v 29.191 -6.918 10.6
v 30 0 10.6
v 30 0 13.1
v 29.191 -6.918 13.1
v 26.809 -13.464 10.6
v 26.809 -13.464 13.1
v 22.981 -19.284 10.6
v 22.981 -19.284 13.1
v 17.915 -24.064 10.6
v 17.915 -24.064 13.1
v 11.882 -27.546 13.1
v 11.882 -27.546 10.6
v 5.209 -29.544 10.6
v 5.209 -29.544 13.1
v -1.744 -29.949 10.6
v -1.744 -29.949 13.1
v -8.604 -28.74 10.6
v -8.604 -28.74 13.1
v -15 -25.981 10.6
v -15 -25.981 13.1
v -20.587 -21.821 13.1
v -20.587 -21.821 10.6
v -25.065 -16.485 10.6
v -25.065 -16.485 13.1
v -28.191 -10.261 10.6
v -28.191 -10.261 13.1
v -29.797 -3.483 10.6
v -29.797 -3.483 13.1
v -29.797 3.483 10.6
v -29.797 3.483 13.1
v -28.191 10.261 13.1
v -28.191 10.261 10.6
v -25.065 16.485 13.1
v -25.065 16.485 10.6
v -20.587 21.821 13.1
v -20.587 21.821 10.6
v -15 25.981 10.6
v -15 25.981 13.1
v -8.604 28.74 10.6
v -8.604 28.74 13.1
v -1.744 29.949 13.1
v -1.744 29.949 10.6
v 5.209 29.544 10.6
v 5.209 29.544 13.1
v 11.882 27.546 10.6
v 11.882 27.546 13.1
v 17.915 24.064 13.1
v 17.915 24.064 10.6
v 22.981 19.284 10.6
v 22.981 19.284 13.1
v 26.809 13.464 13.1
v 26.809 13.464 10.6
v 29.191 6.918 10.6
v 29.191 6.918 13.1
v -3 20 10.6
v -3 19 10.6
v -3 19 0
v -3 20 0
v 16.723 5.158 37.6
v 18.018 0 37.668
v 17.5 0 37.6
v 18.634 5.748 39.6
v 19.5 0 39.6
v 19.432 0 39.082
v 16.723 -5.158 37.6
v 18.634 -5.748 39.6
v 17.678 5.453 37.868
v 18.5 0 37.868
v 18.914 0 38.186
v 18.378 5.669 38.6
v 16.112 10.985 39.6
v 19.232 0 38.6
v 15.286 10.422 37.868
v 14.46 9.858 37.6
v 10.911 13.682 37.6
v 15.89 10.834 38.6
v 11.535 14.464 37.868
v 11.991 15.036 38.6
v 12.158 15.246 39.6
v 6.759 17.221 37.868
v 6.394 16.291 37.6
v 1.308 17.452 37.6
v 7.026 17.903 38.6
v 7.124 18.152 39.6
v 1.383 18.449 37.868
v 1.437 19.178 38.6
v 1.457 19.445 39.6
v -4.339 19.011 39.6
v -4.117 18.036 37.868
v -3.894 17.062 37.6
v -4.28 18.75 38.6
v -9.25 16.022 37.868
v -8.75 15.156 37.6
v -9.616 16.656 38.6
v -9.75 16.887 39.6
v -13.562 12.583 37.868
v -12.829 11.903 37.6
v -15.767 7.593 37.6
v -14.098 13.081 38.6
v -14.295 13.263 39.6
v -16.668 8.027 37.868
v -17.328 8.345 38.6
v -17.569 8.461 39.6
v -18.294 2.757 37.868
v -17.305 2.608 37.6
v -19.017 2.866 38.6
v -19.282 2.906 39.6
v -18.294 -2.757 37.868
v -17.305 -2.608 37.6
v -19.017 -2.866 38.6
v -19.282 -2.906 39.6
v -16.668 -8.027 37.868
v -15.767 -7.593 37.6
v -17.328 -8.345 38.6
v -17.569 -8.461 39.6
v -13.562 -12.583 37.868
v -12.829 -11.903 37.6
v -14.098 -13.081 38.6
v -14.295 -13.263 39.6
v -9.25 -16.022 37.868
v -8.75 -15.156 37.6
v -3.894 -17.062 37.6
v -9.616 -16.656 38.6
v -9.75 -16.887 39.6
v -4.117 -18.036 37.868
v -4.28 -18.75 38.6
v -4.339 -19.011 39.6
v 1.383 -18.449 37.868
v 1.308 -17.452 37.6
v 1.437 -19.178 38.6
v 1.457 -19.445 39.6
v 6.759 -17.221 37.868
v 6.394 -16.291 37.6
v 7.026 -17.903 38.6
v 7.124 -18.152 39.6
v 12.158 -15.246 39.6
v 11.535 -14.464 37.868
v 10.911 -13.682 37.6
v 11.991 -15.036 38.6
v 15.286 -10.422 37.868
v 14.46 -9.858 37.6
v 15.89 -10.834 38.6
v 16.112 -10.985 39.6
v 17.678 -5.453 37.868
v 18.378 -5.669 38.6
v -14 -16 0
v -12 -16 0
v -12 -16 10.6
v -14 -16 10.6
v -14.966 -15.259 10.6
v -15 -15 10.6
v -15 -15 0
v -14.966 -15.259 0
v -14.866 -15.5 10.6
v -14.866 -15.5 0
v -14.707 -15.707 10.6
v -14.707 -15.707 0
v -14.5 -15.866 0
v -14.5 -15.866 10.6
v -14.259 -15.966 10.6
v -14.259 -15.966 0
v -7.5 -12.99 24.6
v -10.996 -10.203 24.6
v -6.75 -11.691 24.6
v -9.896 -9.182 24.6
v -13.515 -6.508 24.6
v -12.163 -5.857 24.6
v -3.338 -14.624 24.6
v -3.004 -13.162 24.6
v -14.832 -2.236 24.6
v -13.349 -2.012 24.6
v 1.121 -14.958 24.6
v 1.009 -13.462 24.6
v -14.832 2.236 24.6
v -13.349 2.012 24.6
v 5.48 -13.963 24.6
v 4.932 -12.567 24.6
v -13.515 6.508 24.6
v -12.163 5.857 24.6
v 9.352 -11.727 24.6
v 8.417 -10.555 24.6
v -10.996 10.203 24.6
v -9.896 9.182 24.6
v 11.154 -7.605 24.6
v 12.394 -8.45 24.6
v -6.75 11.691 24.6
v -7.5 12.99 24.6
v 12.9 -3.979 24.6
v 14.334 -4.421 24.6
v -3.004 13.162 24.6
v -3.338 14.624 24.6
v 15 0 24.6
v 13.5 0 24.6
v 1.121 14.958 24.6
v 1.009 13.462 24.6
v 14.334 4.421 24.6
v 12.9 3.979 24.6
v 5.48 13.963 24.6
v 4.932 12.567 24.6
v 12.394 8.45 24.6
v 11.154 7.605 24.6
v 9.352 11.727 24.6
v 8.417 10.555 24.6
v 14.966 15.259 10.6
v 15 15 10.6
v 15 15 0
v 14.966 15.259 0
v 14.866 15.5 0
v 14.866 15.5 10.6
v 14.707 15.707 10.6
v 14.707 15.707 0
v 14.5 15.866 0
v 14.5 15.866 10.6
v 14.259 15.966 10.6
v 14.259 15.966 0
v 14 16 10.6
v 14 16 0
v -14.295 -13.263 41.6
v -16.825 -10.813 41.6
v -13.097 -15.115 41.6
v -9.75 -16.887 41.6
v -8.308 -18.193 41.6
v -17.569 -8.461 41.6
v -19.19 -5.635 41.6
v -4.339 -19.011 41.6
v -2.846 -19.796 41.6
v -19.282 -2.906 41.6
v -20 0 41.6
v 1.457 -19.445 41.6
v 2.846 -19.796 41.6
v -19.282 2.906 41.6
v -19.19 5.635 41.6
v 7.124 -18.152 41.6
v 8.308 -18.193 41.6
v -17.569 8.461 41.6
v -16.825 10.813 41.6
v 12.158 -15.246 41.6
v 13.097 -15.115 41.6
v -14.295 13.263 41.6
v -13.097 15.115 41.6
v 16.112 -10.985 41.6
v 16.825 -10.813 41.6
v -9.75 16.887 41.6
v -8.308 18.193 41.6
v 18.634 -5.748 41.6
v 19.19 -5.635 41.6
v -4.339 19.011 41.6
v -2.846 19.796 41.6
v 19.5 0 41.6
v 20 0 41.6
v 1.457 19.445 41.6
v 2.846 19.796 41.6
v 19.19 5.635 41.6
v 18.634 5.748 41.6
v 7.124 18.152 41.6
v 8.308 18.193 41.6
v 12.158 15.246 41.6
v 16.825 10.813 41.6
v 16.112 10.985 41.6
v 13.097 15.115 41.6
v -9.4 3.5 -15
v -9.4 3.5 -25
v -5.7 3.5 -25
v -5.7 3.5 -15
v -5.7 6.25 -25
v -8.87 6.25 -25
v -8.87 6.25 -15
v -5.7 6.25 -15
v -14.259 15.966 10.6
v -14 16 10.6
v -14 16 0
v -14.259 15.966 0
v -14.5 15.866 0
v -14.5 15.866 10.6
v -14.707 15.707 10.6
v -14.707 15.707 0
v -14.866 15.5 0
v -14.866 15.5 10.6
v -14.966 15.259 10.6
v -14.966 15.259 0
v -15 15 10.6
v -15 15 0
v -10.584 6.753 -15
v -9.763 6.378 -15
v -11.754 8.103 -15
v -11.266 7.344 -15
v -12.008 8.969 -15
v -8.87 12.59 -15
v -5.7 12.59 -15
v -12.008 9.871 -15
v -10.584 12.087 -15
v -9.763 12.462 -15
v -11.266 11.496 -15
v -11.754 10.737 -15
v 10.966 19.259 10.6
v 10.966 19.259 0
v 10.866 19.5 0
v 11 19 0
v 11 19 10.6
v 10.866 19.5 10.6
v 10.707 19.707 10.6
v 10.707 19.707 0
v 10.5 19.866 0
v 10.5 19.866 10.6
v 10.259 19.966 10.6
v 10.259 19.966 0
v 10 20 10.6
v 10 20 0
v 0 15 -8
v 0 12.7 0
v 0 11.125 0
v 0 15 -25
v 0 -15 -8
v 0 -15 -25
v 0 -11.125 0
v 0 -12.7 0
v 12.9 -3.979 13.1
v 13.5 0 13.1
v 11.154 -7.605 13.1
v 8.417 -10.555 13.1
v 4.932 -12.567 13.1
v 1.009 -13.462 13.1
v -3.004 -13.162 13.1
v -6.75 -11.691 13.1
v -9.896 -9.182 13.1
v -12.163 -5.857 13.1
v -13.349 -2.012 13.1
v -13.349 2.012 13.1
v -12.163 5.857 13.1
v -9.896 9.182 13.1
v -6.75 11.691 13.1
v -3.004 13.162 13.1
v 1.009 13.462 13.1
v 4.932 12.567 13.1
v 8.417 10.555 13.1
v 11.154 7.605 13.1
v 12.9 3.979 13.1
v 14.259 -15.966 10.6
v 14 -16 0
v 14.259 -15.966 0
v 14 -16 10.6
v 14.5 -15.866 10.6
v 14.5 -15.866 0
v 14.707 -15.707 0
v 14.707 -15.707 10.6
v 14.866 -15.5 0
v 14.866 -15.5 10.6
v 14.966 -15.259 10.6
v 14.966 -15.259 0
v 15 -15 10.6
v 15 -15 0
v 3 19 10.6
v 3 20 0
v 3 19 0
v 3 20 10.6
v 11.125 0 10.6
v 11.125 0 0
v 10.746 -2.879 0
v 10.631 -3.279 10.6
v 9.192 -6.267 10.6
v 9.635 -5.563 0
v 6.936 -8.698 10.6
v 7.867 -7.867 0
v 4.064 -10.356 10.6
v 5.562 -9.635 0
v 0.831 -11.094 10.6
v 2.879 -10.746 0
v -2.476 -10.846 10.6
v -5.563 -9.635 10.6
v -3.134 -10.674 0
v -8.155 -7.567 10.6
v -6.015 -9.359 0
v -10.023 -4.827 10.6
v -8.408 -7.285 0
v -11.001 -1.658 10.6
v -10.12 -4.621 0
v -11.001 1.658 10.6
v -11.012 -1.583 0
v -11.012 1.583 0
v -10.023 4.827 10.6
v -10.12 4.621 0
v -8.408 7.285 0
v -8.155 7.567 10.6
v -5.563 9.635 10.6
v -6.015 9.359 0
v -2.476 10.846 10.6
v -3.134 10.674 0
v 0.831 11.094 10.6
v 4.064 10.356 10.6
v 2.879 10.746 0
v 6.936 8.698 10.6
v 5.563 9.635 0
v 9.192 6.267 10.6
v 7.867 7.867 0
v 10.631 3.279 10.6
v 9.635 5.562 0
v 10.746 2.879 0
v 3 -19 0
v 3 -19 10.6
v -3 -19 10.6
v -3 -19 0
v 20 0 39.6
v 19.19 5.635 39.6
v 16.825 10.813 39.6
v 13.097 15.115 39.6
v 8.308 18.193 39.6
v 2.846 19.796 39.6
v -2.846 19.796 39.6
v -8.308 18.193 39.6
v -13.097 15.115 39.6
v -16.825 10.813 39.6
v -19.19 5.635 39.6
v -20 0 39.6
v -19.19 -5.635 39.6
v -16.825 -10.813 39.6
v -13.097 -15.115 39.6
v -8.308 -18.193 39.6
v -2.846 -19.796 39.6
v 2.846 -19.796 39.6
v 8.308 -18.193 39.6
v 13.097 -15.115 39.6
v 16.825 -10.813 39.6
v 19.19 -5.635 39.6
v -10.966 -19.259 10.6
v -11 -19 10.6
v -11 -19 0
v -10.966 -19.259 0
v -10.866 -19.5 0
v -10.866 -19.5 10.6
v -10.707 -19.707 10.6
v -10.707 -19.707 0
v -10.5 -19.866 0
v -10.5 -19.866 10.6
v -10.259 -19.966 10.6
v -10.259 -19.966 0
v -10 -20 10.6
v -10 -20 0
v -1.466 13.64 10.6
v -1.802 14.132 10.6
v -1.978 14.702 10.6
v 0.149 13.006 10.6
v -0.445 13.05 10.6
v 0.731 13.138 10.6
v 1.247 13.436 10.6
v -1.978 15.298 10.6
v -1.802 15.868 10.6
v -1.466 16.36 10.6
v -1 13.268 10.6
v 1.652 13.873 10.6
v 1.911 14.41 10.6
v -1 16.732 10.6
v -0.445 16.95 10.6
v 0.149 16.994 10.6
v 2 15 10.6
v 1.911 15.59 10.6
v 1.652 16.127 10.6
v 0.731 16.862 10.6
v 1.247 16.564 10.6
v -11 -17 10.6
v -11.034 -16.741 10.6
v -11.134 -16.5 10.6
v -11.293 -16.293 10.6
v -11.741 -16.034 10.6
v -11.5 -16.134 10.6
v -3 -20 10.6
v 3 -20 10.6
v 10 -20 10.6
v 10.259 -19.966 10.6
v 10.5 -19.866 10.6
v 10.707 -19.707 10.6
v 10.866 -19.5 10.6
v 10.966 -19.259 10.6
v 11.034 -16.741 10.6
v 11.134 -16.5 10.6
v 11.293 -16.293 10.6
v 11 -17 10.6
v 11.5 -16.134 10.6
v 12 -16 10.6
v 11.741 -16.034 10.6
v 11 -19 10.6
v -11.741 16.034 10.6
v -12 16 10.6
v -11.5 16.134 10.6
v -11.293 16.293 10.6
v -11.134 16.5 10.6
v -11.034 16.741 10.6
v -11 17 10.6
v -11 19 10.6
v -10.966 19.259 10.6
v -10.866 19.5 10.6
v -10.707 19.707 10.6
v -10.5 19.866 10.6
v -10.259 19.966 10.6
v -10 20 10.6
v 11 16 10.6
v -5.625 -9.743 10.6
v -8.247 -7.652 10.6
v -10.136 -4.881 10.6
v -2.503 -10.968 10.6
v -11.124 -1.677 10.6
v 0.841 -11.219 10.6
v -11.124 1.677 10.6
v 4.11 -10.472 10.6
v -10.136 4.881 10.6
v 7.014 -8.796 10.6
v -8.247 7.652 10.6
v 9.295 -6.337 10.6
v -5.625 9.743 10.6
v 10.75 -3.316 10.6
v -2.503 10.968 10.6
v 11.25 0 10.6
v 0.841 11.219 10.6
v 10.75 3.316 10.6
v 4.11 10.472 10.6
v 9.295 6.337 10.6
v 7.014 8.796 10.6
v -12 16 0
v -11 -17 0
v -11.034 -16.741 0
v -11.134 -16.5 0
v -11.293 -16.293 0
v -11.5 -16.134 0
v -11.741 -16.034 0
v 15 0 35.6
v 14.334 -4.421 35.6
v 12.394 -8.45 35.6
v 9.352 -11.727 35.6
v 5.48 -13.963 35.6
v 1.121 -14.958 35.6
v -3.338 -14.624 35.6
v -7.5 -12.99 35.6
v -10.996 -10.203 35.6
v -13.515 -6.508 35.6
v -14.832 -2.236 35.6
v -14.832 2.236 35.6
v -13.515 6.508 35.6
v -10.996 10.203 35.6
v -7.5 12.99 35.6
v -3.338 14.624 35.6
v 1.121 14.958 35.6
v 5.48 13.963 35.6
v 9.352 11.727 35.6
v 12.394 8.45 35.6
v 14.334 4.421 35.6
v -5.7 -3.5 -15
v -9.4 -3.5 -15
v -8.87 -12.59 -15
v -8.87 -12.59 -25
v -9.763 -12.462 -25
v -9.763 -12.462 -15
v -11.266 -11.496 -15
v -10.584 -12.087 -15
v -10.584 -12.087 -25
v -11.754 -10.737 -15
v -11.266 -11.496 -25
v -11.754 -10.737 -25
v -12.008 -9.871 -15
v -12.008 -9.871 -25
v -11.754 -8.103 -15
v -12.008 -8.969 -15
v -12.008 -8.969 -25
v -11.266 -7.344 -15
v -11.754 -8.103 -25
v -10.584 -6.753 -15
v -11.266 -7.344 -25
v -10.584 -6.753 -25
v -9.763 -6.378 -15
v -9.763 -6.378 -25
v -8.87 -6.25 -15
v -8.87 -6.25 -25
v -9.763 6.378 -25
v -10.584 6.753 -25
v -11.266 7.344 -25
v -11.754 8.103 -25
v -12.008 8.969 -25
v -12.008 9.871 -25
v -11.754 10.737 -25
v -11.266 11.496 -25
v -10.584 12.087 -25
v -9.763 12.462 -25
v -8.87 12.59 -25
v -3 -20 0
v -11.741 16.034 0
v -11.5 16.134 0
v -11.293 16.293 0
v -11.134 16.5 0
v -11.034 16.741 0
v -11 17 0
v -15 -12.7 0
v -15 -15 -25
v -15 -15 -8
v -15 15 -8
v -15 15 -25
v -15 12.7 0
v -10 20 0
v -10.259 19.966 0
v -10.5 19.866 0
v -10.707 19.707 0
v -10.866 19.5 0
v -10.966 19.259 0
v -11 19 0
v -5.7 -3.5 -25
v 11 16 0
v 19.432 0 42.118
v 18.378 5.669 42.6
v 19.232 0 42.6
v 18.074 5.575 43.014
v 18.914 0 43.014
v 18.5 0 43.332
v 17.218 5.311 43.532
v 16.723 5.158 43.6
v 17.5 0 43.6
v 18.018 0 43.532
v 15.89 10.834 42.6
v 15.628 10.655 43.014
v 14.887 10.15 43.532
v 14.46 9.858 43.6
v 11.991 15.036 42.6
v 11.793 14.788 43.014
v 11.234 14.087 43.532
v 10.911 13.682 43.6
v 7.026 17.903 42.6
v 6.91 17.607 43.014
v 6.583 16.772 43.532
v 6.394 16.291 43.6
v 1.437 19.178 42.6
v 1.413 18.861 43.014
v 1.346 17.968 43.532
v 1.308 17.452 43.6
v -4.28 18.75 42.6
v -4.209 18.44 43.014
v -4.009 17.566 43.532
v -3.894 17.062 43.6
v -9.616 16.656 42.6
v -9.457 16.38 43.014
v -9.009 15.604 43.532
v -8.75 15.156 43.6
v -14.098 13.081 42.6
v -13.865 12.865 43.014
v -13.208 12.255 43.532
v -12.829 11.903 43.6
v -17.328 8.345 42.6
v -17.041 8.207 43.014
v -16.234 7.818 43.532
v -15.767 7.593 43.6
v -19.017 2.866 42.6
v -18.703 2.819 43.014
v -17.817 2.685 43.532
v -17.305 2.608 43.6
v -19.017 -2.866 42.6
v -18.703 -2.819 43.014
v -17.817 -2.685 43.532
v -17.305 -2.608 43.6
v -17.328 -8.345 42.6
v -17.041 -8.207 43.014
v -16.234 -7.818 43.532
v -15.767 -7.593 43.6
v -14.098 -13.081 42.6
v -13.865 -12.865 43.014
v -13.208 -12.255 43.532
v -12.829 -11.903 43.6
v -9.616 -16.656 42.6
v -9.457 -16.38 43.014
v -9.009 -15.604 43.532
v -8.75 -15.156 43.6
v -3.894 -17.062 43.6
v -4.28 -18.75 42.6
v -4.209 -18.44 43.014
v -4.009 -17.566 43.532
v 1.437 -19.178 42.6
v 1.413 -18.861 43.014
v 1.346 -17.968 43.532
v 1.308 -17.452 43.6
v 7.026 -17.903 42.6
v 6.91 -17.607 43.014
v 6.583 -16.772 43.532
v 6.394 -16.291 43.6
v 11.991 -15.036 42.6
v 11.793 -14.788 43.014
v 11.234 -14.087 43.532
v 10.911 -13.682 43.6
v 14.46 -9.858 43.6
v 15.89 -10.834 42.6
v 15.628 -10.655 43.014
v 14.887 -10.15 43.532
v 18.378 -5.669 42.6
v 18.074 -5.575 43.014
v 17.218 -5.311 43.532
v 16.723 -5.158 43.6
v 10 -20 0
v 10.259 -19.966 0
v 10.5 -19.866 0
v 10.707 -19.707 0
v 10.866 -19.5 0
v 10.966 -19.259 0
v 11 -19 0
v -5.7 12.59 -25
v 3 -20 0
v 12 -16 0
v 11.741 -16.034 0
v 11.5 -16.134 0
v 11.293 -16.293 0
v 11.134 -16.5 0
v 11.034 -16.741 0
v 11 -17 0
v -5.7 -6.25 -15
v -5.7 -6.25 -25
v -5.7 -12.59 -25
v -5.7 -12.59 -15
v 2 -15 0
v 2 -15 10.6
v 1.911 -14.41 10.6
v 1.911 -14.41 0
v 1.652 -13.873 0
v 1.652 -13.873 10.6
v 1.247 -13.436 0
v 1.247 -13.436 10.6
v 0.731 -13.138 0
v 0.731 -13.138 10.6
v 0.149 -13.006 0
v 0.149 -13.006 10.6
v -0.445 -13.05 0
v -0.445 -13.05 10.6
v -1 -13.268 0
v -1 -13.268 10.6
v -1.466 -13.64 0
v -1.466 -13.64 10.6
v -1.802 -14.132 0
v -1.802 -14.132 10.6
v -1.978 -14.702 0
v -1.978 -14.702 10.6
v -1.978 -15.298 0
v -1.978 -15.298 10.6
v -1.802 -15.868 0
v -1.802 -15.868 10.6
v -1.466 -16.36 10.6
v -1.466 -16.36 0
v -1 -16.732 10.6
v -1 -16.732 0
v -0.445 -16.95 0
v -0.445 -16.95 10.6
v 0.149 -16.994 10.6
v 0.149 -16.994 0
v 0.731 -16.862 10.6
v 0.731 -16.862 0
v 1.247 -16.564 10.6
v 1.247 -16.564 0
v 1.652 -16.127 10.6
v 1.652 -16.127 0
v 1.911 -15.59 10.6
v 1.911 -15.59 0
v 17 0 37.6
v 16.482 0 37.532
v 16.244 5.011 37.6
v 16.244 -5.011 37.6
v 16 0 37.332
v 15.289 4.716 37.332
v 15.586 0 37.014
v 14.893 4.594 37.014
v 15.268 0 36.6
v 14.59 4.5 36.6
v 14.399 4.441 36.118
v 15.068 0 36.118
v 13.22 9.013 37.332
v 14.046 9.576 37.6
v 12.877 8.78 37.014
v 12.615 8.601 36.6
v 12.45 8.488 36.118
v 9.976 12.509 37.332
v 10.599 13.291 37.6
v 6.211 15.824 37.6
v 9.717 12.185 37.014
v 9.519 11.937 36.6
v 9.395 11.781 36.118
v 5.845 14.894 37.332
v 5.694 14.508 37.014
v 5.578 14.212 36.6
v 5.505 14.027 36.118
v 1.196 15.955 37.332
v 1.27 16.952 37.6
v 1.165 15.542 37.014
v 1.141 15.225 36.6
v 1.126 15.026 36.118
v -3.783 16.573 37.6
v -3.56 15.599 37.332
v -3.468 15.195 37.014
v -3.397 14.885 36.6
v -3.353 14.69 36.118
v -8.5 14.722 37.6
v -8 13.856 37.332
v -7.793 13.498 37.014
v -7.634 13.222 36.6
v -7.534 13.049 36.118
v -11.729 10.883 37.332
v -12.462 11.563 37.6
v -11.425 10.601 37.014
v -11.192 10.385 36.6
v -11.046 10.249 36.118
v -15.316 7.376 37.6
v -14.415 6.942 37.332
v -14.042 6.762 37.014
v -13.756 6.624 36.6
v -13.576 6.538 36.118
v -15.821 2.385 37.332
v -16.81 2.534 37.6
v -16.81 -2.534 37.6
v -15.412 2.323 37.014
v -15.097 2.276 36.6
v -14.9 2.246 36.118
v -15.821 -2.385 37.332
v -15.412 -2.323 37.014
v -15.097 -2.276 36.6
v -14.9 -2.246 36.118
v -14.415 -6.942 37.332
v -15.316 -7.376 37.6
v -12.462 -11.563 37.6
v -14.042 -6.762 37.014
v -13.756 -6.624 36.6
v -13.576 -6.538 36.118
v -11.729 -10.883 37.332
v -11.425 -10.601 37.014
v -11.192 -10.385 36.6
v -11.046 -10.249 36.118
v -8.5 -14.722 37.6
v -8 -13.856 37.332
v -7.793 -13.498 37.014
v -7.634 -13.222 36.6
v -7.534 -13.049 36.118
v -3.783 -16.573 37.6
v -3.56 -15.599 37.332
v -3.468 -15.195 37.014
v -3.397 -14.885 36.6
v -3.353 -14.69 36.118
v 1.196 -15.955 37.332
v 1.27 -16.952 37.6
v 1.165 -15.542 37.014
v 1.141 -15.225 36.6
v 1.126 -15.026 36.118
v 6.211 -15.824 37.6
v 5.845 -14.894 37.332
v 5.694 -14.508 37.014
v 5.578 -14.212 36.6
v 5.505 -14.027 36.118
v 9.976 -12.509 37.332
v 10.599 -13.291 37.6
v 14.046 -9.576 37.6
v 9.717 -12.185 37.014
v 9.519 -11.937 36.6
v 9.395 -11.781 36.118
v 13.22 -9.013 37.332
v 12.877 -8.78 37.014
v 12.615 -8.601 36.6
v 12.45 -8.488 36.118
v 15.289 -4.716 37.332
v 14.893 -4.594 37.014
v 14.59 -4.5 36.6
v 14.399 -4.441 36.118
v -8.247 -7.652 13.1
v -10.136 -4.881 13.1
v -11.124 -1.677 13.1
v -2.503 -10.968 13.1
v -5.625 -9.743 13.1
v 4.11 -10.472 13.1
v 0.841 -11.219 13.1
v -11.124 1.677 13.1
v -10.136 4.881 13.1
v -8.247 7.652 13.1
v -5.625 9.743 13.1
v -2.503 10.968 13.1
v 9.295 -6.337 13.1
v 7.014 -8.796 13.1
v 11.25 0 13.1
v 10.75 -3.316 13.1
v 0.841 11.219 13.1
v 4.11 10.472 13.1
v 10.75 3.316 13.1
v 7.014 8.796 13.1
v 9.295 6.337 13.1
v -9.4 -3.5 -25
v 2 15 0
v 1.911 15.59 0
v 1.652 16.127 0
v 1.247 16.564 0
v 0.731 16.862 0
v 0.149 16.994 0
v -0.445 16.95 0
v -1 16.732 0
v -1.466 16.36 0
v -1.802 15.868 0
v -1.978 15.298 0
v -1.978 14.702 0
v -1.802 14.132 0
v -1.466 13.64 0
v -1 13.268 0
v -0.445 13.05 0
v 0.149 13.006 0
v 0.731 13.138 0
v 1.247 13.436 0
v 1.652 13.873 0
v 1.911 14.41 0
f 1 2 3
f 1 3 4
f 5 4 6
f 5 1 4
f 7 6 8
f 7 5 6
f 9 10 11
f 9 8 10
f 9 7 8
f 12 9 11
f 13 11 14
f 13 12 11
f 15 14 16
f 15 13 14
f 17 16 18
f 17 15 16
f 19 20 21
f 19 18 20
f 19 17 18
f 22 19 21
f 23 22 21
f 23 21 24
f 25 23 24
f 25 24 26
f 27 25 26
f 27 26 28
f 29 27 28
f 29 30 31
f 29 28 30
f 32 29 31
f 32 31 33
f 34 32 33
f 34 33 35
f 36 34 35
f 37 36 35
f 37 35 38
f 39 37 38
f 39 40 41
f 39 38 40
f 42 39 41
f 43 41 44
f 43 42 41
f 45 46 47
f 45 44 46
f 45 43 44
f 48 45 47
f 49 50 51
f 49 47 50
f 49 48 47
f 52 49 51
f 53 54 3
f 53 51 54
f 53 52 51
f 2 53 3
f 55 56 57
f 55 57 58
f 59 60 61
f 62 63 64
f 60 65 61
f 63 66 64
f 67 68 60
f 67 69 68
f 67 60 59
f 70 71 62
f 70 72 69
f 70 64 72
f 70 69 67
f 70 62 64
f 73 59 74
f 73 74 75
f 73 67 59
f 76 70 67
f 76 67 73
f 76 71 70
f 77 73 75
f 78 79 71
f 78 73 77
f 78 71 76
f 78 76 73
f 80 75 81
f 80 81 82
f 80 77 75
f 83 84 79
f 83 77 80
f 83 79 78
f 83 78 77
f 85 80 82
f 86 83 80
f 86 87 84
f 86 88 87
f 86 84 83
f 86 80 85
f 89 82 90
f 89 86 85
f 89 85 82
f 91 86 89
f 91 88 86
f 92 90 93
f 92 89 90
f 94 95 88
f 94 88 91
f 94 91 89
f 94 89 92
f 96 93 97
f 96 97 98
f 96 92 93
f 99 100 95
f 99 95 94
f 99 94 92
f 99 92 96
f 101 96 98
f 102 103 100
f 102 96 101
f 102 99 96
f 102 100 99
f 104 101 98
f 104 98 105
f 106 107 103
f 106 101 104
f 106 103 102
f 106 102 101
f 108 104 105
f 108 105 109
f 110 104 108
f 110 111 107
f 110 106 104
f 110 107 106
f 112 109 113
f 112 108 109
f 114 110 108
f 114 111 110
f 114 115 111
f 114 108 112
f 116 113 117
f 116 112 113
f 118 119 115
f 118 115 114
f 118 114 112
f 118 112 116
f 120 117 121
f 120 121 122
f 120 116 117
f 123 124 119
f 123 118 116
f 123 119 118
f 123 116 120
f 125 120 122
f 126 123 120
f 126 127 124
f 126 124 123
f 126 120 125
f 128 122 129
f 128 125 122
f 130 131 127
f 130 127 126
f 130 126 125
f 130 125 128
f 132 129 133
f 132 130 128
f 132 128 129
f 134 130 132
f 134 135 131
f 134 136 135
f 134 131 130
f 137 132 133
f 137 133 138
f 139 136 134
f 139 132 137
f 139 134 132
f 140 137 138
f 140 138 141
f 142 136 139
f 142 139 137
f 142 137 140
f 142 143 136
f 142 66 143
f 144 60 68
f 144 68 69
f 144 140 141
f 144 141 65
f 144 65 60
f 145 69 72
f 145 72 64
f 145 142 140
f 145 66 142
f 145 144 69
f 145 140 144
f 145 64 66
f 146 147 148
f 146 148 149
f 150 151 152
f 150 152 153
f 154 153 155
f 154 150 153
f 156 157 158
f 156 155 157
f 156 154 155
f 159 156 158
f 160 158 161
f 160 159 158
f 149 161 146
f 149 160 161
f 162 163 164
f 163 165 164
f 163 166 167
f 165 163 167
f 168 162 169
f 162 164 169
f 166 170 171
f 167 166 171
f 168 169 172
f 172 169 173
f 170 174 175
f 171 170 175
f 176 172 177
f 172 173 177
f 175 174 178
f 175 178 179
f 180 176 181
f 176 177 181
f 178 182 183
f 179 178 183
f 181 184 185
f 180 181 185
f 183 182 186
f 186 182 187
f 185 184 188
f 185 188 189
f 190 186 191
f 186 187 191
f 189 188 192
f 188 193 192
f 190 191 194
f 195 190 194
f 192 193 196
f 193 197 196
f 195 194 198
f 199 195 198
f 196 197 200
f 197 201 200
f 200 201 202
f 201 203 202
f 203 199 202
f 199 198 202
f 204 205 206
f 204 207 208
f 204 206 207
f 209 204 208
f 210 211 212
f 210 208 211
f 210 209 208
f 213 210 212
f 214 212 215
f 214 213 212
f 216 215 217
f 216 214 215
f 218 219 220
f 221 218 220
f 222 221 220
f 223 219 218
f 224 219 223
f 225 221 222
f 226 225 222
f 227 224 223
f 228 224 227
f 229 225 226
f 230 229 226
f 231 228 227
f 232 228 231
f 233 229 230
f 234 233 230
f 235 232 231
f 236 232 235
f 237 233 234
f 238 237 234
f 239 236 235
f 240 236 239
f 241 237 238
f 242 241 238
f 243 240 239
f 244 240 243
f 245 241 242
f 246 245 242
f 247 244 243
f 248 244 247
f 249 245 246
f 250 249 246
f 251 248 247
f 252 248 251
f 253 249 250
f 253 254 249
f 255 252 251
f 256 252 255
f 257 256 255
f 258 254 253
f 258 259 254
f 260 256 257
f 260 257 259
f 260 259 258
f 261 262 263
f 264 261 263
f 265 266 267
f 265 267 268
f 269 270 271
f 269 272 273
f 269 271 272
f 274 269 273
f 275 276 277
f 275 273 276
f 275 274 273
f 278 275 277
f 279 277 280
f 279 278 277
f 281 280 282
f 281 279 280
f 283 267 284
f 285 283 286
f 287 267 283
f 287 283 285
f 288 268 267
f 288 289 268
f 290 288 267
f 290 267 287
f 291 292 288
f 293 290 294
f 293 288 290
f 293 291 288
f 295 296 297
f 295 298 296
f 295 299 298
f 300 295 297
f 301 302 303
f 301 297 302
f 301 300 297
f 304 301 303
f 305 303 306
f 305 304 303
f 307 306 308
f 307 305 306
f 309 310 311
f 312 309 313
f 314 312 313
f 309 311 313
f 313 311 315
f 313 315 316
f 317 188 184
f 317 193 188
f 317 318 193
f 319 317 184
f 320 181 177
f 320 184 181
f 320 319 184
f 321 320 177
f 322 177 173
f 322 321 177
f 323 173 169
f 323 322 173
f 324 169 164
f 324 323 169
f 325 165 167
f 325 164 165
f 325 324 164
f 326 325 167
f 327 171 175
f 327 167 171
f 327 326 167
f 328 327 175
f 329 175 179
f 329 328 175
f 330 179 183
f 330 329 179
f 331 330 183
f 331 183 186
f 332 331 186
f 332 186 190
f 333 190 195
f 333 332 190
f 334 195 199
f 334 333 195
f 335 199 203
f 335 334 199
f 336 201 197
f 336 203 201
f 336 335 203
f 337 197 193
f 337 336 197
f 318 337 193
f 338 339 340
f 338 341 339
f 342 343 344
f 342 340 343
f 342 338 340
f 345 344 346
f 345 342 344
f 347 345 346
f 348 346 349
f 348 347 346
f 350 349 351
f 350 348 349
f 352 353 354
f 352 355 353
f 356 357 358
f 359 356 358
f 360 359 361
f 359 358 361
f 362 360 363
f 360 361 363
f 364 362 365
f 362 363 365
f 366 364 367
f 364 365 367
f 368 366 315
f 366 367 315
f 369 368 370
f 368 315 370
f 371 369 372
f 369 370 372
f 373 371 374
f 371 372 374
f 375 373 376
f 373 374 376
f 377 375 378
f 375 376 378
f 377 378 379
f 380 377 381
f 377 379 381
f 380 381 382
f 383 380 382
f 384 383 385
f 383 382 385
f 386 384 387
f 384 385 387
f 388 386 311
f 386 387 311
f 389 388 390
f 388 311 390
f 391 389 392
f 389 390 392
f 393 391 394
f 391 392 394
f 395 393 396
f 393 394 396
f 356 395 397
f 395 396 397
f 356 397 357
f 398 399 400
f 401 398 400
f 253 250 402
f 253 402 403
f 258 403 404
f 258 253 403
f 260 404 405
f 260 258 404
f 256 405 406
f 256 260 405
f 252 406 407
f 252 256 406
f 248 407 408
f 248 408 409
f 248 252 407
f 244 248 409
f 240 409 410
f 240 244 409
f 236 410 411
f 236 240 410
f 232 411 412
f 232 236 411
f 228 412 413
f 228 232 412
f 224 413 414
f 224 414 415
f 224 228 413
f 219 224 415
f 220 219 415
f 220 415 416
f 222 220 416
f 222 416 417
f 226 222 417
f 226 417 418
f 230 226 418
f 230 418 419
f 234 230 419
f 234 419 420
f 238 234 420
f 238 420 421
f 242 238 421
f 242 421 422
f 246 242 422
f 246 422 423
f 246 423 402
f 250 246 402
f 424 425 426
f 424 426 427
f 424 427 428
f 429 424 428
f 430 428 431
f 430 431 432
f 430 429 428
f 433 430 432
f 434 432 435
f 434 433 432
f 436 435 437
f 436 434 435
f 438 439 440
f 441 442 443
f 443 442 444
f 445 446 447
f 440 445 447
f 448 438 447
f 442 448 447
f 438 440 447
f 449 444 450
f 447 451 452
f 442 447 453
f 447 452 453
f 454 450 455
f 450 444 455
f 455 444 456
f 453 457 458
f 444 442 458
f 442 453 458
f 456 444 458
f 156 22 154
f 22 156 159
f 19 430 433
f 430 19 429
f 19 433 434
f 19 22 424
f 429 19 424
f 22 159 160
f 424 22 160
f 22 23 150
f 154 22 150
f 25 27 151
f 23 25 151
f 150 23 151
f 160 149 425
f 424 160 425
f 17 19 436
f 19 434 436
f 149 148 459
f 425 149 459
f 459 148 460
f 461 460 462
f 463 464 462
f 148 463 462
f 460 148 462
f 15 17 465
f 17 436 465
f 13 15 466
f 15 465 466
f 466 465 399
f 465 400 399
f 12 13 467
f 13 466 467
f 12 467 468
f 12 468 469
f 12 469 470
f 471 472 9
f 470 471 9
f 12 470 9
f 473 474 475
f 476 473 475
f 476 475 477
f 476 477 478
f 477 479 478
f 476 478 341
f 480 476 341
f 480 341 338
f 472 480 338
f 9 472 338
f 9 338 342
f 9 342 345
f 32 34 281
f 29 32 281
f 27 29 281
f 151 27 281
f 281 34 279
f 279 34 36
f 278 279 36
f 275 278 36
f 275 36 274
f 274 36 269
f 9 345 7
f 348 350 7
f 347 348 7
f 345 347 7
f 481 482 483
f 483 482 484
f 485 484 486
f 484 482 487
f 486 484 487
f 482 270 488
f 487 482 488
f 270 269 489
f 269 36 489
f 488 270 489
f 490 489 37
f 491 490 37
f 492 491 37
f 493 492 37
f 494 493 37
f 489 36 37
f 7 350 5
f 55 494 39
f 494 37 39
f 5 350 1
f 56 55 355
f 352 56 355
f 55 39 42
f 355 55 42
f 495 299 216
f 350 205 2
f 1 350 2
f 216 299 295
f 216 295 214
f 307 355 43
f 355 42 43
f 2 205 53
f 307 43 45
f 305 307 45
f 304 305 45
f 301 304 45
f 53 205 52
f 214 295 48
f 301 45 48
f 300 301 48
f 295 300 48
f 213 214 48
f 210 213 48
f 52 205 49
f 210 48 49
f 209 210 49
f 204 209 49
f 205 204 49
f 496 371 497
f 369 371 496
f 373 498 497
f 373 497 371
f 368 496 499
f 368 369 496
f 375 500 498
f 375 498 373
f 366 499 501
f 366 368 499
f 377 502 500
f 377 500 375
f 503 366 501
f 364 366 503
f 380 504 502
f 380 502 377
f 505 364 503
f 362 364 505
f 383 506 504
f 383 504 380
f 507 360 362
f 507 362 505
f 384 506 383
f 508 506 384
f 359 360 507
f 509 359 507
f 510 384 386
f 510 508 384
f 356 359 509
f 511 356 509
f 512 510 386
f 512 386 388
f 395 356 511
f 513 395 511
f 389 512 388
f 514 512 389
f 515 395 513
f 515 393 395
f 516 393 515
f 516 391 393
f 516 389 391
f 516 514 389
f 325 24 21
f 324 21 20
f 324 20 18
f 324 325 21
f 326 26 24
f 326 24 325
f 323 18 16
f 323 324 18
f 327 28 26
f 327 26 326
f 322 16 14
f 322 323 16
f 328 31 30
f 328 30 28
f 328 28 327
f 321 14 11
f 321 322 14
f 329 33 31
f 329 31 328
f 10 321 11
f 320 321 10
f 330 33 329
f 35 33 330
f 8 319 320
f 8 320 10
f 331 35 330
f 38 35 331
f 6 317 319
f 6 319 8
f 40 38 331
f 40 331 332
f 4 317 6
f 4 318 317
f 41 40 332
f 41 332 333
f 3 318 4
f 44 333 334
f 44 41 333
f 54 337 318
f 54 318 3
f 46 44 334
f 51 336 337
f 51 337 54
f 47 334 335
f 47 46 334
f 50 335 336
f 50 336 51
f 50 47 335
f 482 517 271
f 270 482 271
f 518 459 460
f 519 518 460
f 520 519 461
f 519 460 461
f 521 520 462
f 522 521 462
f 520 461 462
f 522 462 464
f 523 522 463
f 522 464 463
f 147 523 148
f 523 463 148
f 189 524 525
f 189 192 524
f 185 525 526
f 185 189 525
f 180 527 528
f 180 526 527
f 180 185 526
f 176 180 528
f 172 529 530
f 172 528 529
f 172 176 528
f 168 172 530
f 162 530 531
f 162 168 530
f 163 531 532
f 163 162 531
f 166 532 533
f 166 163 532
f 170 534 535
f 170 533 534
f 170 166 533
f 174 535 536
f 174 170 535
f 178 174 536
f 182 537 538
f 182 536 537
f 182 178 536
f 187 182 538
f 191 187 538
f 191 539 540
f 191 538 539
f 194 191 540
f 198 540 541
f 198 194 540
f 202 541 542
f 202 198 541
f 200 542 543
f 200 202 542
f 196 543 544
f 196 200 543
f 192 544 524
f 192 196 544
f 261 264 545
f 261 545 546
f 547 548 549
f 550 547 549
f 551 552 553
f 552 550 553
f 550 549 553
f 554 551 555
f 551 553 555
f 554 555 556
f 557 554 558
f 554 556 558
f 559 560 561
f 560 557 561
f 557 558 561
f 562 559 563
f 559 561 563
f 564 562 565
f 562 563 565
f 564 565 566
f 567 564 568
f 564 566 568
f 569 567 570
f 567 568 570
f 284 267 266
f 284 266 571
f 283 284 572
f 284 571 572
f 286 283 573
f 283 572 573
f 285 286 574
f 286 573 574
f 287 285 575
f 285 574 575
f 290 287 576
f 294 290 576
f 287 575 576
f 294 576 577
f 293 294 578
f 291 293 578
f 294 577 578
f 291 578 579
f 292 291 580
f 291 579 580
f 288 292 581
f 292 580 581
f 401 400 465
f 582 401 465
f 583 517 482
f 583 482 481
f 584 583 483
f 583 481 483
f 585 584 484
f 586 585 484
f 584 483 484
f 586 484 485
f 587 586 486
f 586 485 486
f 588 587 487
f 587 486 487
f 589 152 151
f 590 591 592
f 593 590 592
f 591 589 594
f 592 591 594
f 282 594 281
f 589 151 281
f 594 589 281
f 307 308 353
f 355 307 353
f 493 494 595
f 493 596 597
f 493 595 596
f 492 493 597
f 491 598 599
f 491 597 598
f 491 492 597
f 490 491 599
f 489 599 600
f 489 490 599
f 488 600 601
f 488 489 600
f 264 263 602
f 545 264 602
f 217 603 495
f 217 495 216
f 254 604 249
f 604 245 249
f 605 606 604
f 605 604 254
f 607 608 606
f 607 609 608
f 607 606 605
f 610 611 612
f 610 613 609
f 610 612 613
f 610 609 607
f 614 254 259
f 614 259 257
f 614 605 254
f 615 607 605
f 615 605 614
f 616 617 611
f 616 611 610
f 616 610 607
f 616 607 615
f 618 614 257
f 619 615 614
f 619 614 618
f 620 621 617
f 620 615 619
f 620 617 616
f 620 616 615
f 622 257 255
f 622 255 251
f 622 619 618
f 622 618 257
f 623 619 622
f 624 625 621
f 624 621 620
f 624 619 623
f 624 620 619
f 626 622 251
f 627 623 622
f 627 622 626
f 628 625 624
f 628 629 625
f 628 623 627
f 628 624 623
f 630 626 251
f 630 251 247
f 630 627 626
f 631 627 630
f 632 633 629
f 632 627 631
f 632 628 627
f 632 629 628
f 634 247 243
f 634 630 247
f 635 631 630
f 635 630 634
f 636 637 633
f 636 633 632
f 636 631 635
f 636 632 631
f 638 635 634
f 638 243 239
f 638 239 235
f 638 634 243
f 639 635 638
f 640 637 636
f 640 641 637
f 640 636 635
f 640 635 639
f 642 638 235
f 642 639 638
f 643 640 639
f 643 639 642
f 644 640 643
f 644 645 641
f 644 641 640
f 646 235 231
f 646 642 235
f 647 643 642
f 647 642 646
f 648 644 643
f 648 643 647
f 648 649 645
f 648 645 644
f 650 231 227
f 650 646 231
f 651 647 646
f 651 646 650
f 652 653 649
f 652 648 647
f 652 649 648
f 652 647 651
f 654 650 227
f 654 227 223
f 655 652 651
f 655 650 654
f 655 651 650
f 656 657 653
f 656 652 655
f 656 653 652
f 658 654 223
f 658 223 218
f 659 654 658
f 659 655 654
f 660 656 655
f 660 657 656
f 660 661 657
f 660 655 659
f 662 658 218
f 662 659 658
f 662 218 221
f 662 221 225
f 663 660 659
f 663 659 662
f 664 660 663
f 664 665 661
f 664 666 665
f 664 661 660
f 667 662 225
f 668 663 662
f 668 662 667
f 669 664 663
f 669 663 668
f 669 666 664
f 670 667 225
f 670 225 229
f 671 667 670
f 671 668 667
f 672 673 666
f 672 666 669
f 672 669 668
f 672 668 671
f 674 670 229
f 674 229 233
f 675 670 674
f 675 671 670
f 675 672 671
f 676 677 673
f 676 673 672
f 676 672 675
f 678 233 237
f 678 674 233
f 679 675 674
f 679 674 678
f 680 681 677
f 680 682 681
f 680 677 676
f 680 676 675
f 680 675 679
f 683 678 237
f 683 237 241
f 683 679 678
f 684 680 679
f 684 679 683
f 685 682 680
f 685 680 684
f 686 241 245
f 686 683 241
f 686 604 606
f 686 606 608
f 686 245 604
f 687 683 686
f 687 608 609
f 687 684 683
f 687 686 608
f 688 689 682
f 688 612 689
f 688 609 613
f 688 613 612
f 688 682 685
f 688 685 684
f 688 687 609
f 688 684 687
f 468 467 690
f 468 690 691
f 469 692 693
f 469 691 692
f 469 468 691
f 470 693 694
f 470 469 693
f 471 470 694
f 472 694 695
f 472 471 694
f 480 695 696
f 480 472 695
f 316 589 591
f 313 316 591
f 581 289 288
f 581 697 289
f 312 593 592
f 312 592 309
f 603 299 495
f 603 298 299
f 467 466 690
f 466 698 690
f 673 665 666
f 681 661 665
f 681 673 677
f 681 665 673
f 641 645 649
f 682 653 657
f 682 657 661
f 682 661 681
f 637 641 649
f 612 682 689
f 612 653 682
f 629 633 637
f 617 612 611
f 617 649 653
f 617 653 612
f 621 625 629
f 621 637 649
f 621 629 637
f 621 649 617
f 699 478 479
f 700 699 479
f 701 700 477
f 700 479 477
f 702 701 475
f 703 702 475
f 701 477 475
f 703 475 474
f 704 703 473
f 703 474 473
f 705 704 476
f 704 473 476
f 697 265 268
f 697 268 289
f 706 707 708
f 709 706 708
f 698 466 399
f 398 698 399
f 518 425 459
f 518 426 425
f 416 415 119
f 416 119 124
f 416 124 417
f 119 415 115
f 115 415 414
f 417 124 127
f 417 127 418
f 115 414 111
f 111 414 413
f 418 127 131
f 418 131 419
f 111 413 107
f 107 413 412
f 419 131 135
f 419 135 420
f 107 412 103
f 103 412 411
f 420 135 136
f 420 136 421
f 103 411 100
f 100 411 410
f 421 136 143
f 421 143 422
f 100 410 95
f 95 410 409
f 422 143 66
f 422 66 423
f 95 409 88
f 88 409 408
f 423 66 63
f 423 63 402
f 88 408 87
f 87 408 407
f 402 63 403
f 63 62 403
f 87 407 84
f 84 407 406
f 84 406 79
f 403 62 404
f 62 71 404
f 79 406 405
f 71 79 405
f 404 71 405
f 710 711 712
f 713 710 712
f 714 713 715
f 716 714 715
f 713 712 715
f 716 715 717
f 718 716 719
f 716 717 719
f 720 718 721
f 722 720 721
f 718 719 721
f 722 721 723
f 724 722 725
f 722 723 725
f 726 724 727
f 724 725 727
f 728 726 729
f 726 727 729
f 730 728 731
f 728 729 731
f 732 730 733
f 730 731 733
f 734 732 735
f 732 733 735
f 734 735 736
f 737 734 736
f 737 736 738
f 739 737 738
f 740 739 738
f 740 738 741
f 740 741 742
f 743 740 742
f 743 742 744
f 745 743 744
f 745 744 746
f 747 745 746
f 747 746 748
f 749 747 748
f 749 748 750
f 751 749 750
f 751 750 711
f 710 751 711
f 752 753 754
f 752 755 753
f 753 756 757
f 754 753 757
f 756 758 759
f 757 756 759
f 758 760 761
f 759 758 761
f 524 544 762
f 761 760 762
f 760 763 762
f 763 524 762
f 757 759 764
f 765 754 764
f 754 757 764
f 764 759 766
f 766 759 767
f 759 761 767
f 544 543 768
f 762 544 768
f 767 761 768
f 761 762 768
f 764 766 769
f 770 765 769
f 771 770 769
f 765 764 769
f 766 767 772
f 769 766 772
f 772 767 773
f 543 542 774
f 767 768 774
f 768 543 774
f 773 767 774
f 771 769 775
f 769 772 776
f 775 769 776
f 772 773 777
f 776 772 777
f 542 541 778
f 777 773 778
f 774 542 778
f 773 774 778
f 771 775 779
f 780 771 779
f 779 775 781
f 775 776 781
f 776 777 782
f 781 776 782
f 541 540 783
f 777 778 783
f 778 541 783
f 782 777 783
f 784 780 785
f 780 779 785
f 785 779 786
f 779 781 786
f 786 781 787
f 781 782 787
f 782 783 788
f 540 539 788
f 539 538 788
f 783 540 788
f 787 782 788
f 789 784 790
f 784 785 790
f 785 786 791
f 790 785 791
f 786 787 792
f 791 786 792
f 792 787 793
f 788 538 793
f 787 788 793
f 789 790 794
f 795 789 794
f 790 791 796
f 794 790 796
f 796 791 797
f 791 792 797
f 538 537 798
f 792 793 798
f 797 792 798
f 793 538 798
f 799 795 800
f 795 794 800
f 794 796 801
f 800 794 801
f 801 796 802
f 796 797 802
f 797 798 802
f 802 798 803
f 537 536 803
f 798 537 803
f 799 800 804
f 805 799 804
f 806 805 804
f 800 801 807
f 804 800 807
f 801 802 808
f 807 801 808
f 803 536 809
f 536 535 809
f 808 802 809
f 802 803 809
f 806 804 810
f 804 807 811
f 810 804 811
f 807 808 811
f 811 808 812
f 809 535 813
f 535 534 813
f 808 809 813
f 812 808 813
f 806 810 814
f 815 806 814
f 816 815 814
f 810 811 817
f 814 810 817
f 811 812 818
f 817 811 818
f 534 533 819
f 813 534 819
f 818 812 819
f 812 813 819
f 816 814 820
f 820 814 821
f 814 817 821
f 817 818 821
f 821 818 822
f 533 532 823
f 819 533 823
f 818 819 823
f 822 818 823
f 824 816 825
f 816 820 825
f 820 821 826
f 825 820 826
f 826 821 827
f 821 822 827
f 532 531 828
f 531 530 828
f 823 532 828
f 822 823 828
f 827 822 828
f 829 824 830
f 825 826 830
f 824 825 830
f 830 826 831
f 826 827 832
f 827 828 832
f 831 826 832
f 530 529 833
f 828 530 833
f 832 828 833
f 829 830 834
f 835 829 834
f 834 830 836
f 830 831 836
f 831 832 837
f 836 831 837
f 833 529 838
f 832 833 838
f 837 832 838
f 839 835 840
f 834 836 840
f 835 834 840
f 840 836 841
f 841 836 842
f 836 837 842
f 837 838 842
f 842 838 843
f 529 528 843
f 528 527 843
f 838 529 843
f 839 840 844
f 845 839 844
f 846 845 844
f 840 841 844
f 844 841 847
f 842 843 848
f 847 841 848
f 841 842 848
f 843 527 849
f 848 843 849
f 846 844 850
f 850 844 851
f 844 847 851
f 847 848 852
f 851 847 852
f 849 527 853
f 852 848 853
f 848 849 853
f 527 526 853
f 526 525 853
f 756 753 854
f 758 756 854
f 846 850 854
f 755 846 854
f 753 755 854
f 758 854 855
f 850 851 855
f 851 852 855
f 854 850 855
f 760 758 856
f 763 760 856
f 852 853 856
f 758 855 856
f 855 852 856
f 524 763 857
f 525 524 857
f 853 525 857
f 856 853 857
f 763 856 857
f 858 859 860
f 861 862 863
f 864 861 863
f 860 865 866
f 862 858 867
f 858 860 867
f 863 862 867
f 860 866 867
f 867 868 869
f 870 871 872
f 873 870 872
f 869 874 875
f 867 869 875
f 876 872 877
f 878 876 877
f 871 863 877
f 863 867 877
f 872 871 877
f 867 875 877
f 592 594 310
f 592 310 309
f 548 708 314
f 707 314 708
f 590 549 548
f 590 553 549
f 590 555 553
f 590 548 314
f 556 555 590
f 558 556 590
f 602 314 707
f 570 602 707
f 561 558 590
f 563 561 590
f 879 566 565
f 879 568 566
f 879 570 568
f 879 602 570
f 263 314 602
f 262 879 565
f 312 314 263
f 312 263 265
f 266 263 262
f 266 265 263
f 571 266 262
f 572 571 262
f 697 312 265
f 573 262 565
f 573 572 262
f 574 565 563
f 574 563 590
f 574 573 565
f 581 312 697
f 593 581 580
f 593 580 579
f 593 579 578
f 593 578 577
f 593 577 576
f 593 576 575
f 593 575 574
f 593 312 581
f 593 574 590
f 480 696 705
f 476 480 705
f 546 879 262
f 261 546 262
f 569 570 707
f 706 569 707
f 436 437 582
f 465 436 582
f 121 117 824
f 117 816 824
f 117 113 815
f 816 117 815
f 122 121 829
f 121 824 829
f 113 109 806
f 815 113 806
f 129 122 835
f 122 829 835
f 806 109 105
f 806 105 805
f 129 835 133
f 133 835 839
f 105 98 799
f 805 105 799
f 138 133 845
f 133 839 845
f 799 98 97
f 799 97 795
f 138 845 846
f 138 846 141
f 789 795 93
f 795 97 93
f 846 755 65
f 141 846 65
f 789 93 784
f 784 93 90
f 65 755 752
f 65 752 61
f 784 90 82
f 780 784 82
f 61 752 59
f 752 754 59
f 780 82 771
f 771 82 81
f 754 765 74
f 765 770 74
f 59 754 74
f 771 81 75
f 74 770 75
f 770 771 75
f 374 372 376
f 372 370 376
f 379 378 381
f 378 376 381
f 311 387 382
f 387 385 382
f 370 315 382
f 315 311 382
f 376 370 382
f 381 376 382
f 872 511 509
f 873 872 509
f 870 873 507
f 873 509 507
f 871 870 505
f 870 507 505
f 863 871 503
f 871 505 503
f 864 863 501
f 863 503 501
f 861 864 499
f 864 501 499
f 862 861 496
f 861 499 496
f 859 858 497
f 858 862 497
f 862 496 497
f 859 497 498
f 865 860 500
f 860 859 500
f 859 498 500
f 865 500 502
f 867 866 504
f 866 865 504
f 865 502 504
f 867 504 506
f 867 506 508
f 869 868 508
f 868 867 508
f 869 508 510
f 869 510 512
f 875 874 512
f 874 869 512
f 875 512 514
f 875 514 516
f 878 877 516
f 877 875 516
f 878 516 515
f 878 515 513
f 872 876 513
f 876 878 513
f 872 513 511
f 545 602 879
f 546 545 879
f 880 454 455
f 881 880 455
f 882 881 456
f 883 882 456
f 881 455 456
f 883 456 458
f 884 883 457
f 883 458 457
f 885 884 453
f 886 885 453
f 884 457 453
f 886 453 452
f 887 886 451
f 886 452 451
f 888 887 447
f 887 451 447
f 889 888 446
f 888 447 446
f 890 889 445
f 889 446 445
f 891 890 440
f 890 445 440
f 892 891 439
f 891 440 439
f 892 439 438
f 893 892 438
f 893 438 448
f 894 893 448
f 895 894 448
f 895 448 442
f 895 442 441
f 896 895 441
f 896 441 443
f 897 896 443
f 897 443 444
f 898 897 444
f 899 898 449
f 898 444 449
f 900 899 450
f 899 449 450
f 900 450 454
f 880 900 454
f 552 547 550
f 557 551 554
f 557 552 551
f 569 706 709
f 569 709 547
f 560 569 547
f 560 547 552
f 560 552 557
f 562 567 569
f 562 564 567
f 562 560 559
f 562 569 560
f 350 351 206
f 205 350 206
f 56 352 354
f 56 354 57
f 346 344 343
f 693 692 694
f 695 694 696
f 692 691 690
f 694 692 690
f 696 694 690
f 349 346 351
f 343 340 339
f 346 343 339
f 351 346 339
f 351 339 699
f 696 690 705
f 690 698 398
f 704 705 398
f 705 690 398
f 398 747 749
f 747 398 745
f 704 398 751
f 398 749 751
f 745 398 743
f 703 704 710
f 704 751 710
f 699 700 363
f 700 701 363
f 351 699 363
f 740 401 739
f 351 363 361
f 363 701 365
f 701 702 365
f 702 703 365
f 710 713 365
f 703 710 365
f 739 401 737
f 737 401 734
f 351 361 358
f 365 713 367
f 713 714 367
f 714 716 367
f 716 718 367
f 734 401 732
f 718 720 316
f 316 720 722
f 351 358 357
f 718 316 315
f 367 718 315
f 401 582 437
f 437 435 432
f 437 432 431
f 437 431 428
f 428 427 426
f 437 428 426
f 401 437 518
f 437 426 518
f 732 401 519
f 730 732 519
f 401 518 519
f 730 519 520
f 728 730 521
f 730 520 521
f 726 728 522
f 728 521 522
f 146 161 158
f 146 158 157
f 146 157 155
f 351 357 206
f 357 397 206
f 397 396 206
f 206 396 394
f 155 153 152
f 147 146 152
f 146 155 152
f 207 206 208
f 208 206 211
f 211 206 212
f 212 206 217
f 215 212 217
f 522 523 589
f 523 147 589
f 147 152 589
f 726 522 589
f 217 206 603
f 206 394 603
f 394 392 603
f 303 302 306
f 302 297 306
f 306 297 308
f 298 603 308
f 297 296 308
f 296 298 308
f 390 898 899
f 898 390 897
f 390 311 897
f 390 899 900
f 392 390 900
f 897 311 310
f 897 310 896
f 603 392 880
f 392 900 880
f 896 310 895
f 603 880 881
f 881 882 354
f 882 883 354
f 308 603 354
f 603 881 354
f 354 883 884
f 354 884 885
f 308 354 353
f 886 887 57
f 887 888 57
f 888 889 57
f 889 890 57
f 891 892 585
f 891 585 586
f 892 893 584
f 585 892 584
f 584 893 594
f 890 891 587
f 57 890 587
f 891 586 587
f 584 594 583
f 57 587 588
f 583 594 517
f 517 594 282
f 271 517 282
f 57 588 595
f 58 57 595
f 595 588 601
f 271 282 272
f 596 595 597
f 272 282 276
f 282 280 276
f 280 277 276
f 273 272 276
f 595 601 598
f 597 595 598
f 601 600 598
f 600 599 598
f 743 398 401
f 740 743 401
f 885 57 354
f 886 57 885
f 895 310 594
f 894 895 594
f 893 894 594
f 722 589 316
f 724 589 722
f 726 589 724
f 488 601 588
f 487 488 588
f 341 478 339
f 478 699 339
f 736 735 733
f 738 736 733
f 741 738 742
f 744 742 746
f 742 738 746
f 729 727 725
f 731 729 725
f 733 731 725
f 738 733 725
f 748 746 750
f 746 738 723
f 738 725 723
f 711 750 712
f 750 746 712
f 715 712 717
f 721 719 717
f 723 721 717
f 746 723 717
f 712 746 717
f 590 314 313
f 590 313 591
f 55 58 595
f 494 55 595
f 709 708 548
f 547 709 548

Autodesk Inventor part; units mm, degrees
ref_plane "YZ Plane" through (0, 0, 0) normal (1, 0, 0) x (0, 1, 0)
ref_plane "XZ Plane" through (0, 0, 0) normal (0, 1, 0) x (-1, 0, 0)
ref_plane "XY Plane" through (0, 0, 0) normal (0, 0, 1) x (1, 0, 0)
sketch "Base" plane through (0, 0, 0) normal (0, 0, 1) x (1, 0, 0)
  line L0 (-15, -20) -> (15, -20)
  line L1 (15, -20) -> (15, 20)
  line L2 (15, 20) -> (-15, 20)
  line L3 (-15, 20) -> (-15, -20)
  line L4 (-15, -20) -> (15, 20) construction
  line L5 (15, -20) -> (-15, 20) construction
  circle A0 centre (0, 0) radius 11.125
  line L6 (-15, 20) -> (-11, 20)
  line L7 (-11, 20) -> (-11, 16)
  line L8 (-11, 16) -> (-15, 16)
  line L9 (-15, 16) -> (-15, 20)
  line L10 (-21, 0) -> (21, 0) construction
  line L11 (0, -28) -> (0, 28) construction
  line L12 (11, 20) -> (11, 16)
  line L13 (11, 16) -> (15, 16)
  line L14 (-11, -20) -> (-11, -16)
  line L15 (-11, -16) -> (-15, -16)
  line L16 (11, -16) -> (15, -16)
  line L17 (11, -20) -> (11, -16)
  dimension "d0" = 40
  dimension "d1" = 30
  dimension "d2" = 22.25
  dimension "d5" = 4
extrude "BaseFeature" add sketch "Base" along normal blind 10.6 contours L14 L15 L3 L8 L7 L2 L12 L13 L1 L16 L17 L0
fillet "BaseFilletsFeature" radius 1 11 edges at (-15, 16, 5.3) (-11, 20, 5.3) (11, 20, 5.3) (15, 16, 5.3) (-11, 16, 5.3) (-15, -16, 5.3) (-11, -16, 5.3) (-11, -20, 5.3) (11, -20, 5.3) (11, -16, 5.3) (15, -16, 5.3)
sketch "MountHoles" plane through (0, 0, 10.6) normal (0, 0, 1) x (1, 0, 0)
  line L0 (10, 20) -> (-10, 20) projected
  line L1 (-3, 20) -> (3, 20)
  line L2 (3, 20) -> (3, 19)
  line L3 (3, 19) -> (-3, 19)
  line L4 (-3, 19) -> (-3, 20)
  line L5 (-21, 0) -> (21, 0) construction
  line L6 (3, -20) -> (3, -19)
  line L7 (3, -19) -> (-3, -19)
  line L8 (-3, -19) -> (-3, -20)
  line L9 (-10, -20) -> (10, -20) projected
  circle A0 centre (0, 0) radius 11.125 construction
  circle A1 centre (0, 15) radius 2
  circle A2 centre (0, -15) radius 2
  line L10 (0, -28) -> (0, 28) construction
  point P0 (0, 20)
  dimension "d7" = 1
  dimension "d8" = 6
  dimension "d9" = 4
  dimension "d10" = 30
extrude "MountHolesFeature" cut sketch "MountHoles" against normal through all
sketch "Body" plane through (0, 0, 0) normal (0, 0, -1) x (-1, 0, 0)
  line L0 (15, 15) -> (0, 15)
  line L1 (0, 15) -> (0, -15)
  line L2 (0, -15) -> (15, -15)
  line L3 (15, -15) -> (15, 15)
  line L4 (15, 15) -> (15, -15) projected
  point P0 (0, 0)
  dimension "d13" = 15
extrude "BodyFeature" add sketch "Body" along normal blind 25
sketch "Chamfer" plane through (-15, -15, 10.6) normal (-1, 0, 0) x (0, 0, 1)
  line L0 (-10.6, 0) -> (-35.6, 0) projected
  line L1 (-10.6, 0) -> (-10.6, 2.3)
  line L2 (-10.6, 0) -> (-10.6, 30) projected
  line L3 (-10.6, 2.3) -> (-18.6, 0)
  line L4 (-42.72, 15) -> (7.12, 15) construction
  line L5 (-10.6, 30) -> (-10.6, 27.7)
  line L6 (-10.6, 27.7) -> (-18.6, 30)
  line L7 (-10.6, 30) -> (-35.6, 30) projected
  line L8 (-18.6, 30) -> (-18.6, 0) construction
  point P0 (-10.6, 15)
  dimension "d16" = 8
  dimension "d17" = 2.3
extrude "ChamferFeature" cut sketch "Chamfer" against normal through all
sketch "Terminals" plane through (0, 0, -25) normal (0, 0, -1) x (-1, 0, 0)
  line L0 (15, -15) -> (15, 15) construction
  line L1 (15, 15) -> (0, 15) construction
  line L2 (0, 15) -> (0, -15) construction
  line L3 (0, -15) -> (15, -15) construction
  line L4 (0, -15) -> (15, -15) projected
  line L5 (5.7, -15) -> (5.7, 15) construction
  line L6 (21, 0) -> (-21, 0) construction
  line L7 (5.7, -12.59) -> (8.87, -12.59)
  line L8 (8.87, -12.59) -> (8.87, -6.25) construction
  line L9 (8.87, -6.25) -> (5.7, -6.25)
  line L10 (5.7, -6.25) -> (5.7, -12.59)
  circle A0 centre (8.87, -9.42) radius 3.17
  line L11 (8.87, -9.42) -> (12.04, -9.42) construction
  line L12 (5.7, 12.59) -> (8.87, 12.59)
  line L13 (8.87, 6.25) -> (5.7, 6.25)
  line L14 (5.7, 6.25) -> (5.7, 12.59)
  circle A1 centre (8.87, 9.42) radius 3.17
  line L15 (5.7, -3.5) -> (9.4, -3.5)
  line L16 (9.4, -3.5) -> (9.4, 3.5)
  line L17 (9.4, 3.5) -> (5.7, 3.5)
  line L18 (5.7, 3.5) -> (5.7, -3.5)
  point P0 (0, 0)
  point P1 (5.7, 0)
  dimension "d20" = 6.34
  dimension "d21" = 5.7
  dimension "d22" = 12.5
  dimension "d23" = 3.7
  dimension "d24" = 7
extrude "TerminalsFeature" cut sketch "Terminals" against normal blind 10
sketch "Ring" plane through (0, 0, 10.6) normal (0, 0, 1) x (1, 0, 0)
  arc A0 (0, -11.125) -> (0, 11.125) centre (0, 0) ccw projected
  circle A1 centre (0, 0) radius 30
  circle A2 centre (0, 0) radius 11.25
  dimension "d27" = 60
  dimension "d28" = 22.5
extrude "RingFeature" add sketch "Ring" along normal blind 2.5
sketch "ButtonNeck" plane through (0, 0, 13.1) normal (0, 0, 1) x (1, 0, 0)
  arc A0 (0, -11.125) -> (0, 11.125) centre (0, 0) ccw projected
  circle A1 centre (0, 0) radius 13.5
  dimension "d31" = 27
extrude "ButtonNeckFeature" add sketch "ButtonNeck" along normal blind 11.5
sketch "ButtonBody" plane through (0, 0, 24.6) normal (0, 0, 1) x (1, 0, 0)
  circle A0 centre (0, 0) radius 11.25 projected
  circle A1 centre (0, 0) radius 15
  dimension "d34" = 30
extrude "ButtonBodyFeature" add sketch "ButtonBody" along normal blind 13 contours A0 | A1
sketch "ButtonHead" plane through (0, 0, 0) normal (0, 1, 0) x (-1, 0, 0)
  line L0 (15, 37.6) -> (-15, 37.6) projected
  line L1 (-15, 37.6) -> (-19.5, 37.6)
  line L2 (-19.5, 37.6) -> (-19.5, 39.6)
  line L3 (-19.5, 39.6) -> (-20, 39.6)
  line L4 (-20, 39.6) -> (-20, 41.6)
  line L5 (-20, 41.6) -> (-19.5, 41.6)
  line L6 (-19.5, 41.6) -> (-19.5, 43.6)
  line L7 (-19.5, 43.6) -> (0, 43.6)
  line L8 (0, 43.6) -> (0, 37.6)
  line L9 (-20, 40.6) -> (0, 40.6) construction
  line L10 (0, -38.72) -> (0, 57.32) projected
  point P0 (0, 0)
  point P1 (-17.25, 37.6)
  dimension "d37" = 6
  dimension "d38" = 2
  dimension "d39" = 20
  dimension "d40" = 0.5
revolve "ButtonHeadFeature" add sketch "ButtonHead" angle 360 about axis through (0, 0, -10) along (0, 0, 1)
fillet "ButtonHeadFilletsFeature" radius 2 3 edges at (-15, 0, 37.6) (-19.5, 0, 37.6) (-19.5, 0, 43.6)
properties part number "E-Stop"
